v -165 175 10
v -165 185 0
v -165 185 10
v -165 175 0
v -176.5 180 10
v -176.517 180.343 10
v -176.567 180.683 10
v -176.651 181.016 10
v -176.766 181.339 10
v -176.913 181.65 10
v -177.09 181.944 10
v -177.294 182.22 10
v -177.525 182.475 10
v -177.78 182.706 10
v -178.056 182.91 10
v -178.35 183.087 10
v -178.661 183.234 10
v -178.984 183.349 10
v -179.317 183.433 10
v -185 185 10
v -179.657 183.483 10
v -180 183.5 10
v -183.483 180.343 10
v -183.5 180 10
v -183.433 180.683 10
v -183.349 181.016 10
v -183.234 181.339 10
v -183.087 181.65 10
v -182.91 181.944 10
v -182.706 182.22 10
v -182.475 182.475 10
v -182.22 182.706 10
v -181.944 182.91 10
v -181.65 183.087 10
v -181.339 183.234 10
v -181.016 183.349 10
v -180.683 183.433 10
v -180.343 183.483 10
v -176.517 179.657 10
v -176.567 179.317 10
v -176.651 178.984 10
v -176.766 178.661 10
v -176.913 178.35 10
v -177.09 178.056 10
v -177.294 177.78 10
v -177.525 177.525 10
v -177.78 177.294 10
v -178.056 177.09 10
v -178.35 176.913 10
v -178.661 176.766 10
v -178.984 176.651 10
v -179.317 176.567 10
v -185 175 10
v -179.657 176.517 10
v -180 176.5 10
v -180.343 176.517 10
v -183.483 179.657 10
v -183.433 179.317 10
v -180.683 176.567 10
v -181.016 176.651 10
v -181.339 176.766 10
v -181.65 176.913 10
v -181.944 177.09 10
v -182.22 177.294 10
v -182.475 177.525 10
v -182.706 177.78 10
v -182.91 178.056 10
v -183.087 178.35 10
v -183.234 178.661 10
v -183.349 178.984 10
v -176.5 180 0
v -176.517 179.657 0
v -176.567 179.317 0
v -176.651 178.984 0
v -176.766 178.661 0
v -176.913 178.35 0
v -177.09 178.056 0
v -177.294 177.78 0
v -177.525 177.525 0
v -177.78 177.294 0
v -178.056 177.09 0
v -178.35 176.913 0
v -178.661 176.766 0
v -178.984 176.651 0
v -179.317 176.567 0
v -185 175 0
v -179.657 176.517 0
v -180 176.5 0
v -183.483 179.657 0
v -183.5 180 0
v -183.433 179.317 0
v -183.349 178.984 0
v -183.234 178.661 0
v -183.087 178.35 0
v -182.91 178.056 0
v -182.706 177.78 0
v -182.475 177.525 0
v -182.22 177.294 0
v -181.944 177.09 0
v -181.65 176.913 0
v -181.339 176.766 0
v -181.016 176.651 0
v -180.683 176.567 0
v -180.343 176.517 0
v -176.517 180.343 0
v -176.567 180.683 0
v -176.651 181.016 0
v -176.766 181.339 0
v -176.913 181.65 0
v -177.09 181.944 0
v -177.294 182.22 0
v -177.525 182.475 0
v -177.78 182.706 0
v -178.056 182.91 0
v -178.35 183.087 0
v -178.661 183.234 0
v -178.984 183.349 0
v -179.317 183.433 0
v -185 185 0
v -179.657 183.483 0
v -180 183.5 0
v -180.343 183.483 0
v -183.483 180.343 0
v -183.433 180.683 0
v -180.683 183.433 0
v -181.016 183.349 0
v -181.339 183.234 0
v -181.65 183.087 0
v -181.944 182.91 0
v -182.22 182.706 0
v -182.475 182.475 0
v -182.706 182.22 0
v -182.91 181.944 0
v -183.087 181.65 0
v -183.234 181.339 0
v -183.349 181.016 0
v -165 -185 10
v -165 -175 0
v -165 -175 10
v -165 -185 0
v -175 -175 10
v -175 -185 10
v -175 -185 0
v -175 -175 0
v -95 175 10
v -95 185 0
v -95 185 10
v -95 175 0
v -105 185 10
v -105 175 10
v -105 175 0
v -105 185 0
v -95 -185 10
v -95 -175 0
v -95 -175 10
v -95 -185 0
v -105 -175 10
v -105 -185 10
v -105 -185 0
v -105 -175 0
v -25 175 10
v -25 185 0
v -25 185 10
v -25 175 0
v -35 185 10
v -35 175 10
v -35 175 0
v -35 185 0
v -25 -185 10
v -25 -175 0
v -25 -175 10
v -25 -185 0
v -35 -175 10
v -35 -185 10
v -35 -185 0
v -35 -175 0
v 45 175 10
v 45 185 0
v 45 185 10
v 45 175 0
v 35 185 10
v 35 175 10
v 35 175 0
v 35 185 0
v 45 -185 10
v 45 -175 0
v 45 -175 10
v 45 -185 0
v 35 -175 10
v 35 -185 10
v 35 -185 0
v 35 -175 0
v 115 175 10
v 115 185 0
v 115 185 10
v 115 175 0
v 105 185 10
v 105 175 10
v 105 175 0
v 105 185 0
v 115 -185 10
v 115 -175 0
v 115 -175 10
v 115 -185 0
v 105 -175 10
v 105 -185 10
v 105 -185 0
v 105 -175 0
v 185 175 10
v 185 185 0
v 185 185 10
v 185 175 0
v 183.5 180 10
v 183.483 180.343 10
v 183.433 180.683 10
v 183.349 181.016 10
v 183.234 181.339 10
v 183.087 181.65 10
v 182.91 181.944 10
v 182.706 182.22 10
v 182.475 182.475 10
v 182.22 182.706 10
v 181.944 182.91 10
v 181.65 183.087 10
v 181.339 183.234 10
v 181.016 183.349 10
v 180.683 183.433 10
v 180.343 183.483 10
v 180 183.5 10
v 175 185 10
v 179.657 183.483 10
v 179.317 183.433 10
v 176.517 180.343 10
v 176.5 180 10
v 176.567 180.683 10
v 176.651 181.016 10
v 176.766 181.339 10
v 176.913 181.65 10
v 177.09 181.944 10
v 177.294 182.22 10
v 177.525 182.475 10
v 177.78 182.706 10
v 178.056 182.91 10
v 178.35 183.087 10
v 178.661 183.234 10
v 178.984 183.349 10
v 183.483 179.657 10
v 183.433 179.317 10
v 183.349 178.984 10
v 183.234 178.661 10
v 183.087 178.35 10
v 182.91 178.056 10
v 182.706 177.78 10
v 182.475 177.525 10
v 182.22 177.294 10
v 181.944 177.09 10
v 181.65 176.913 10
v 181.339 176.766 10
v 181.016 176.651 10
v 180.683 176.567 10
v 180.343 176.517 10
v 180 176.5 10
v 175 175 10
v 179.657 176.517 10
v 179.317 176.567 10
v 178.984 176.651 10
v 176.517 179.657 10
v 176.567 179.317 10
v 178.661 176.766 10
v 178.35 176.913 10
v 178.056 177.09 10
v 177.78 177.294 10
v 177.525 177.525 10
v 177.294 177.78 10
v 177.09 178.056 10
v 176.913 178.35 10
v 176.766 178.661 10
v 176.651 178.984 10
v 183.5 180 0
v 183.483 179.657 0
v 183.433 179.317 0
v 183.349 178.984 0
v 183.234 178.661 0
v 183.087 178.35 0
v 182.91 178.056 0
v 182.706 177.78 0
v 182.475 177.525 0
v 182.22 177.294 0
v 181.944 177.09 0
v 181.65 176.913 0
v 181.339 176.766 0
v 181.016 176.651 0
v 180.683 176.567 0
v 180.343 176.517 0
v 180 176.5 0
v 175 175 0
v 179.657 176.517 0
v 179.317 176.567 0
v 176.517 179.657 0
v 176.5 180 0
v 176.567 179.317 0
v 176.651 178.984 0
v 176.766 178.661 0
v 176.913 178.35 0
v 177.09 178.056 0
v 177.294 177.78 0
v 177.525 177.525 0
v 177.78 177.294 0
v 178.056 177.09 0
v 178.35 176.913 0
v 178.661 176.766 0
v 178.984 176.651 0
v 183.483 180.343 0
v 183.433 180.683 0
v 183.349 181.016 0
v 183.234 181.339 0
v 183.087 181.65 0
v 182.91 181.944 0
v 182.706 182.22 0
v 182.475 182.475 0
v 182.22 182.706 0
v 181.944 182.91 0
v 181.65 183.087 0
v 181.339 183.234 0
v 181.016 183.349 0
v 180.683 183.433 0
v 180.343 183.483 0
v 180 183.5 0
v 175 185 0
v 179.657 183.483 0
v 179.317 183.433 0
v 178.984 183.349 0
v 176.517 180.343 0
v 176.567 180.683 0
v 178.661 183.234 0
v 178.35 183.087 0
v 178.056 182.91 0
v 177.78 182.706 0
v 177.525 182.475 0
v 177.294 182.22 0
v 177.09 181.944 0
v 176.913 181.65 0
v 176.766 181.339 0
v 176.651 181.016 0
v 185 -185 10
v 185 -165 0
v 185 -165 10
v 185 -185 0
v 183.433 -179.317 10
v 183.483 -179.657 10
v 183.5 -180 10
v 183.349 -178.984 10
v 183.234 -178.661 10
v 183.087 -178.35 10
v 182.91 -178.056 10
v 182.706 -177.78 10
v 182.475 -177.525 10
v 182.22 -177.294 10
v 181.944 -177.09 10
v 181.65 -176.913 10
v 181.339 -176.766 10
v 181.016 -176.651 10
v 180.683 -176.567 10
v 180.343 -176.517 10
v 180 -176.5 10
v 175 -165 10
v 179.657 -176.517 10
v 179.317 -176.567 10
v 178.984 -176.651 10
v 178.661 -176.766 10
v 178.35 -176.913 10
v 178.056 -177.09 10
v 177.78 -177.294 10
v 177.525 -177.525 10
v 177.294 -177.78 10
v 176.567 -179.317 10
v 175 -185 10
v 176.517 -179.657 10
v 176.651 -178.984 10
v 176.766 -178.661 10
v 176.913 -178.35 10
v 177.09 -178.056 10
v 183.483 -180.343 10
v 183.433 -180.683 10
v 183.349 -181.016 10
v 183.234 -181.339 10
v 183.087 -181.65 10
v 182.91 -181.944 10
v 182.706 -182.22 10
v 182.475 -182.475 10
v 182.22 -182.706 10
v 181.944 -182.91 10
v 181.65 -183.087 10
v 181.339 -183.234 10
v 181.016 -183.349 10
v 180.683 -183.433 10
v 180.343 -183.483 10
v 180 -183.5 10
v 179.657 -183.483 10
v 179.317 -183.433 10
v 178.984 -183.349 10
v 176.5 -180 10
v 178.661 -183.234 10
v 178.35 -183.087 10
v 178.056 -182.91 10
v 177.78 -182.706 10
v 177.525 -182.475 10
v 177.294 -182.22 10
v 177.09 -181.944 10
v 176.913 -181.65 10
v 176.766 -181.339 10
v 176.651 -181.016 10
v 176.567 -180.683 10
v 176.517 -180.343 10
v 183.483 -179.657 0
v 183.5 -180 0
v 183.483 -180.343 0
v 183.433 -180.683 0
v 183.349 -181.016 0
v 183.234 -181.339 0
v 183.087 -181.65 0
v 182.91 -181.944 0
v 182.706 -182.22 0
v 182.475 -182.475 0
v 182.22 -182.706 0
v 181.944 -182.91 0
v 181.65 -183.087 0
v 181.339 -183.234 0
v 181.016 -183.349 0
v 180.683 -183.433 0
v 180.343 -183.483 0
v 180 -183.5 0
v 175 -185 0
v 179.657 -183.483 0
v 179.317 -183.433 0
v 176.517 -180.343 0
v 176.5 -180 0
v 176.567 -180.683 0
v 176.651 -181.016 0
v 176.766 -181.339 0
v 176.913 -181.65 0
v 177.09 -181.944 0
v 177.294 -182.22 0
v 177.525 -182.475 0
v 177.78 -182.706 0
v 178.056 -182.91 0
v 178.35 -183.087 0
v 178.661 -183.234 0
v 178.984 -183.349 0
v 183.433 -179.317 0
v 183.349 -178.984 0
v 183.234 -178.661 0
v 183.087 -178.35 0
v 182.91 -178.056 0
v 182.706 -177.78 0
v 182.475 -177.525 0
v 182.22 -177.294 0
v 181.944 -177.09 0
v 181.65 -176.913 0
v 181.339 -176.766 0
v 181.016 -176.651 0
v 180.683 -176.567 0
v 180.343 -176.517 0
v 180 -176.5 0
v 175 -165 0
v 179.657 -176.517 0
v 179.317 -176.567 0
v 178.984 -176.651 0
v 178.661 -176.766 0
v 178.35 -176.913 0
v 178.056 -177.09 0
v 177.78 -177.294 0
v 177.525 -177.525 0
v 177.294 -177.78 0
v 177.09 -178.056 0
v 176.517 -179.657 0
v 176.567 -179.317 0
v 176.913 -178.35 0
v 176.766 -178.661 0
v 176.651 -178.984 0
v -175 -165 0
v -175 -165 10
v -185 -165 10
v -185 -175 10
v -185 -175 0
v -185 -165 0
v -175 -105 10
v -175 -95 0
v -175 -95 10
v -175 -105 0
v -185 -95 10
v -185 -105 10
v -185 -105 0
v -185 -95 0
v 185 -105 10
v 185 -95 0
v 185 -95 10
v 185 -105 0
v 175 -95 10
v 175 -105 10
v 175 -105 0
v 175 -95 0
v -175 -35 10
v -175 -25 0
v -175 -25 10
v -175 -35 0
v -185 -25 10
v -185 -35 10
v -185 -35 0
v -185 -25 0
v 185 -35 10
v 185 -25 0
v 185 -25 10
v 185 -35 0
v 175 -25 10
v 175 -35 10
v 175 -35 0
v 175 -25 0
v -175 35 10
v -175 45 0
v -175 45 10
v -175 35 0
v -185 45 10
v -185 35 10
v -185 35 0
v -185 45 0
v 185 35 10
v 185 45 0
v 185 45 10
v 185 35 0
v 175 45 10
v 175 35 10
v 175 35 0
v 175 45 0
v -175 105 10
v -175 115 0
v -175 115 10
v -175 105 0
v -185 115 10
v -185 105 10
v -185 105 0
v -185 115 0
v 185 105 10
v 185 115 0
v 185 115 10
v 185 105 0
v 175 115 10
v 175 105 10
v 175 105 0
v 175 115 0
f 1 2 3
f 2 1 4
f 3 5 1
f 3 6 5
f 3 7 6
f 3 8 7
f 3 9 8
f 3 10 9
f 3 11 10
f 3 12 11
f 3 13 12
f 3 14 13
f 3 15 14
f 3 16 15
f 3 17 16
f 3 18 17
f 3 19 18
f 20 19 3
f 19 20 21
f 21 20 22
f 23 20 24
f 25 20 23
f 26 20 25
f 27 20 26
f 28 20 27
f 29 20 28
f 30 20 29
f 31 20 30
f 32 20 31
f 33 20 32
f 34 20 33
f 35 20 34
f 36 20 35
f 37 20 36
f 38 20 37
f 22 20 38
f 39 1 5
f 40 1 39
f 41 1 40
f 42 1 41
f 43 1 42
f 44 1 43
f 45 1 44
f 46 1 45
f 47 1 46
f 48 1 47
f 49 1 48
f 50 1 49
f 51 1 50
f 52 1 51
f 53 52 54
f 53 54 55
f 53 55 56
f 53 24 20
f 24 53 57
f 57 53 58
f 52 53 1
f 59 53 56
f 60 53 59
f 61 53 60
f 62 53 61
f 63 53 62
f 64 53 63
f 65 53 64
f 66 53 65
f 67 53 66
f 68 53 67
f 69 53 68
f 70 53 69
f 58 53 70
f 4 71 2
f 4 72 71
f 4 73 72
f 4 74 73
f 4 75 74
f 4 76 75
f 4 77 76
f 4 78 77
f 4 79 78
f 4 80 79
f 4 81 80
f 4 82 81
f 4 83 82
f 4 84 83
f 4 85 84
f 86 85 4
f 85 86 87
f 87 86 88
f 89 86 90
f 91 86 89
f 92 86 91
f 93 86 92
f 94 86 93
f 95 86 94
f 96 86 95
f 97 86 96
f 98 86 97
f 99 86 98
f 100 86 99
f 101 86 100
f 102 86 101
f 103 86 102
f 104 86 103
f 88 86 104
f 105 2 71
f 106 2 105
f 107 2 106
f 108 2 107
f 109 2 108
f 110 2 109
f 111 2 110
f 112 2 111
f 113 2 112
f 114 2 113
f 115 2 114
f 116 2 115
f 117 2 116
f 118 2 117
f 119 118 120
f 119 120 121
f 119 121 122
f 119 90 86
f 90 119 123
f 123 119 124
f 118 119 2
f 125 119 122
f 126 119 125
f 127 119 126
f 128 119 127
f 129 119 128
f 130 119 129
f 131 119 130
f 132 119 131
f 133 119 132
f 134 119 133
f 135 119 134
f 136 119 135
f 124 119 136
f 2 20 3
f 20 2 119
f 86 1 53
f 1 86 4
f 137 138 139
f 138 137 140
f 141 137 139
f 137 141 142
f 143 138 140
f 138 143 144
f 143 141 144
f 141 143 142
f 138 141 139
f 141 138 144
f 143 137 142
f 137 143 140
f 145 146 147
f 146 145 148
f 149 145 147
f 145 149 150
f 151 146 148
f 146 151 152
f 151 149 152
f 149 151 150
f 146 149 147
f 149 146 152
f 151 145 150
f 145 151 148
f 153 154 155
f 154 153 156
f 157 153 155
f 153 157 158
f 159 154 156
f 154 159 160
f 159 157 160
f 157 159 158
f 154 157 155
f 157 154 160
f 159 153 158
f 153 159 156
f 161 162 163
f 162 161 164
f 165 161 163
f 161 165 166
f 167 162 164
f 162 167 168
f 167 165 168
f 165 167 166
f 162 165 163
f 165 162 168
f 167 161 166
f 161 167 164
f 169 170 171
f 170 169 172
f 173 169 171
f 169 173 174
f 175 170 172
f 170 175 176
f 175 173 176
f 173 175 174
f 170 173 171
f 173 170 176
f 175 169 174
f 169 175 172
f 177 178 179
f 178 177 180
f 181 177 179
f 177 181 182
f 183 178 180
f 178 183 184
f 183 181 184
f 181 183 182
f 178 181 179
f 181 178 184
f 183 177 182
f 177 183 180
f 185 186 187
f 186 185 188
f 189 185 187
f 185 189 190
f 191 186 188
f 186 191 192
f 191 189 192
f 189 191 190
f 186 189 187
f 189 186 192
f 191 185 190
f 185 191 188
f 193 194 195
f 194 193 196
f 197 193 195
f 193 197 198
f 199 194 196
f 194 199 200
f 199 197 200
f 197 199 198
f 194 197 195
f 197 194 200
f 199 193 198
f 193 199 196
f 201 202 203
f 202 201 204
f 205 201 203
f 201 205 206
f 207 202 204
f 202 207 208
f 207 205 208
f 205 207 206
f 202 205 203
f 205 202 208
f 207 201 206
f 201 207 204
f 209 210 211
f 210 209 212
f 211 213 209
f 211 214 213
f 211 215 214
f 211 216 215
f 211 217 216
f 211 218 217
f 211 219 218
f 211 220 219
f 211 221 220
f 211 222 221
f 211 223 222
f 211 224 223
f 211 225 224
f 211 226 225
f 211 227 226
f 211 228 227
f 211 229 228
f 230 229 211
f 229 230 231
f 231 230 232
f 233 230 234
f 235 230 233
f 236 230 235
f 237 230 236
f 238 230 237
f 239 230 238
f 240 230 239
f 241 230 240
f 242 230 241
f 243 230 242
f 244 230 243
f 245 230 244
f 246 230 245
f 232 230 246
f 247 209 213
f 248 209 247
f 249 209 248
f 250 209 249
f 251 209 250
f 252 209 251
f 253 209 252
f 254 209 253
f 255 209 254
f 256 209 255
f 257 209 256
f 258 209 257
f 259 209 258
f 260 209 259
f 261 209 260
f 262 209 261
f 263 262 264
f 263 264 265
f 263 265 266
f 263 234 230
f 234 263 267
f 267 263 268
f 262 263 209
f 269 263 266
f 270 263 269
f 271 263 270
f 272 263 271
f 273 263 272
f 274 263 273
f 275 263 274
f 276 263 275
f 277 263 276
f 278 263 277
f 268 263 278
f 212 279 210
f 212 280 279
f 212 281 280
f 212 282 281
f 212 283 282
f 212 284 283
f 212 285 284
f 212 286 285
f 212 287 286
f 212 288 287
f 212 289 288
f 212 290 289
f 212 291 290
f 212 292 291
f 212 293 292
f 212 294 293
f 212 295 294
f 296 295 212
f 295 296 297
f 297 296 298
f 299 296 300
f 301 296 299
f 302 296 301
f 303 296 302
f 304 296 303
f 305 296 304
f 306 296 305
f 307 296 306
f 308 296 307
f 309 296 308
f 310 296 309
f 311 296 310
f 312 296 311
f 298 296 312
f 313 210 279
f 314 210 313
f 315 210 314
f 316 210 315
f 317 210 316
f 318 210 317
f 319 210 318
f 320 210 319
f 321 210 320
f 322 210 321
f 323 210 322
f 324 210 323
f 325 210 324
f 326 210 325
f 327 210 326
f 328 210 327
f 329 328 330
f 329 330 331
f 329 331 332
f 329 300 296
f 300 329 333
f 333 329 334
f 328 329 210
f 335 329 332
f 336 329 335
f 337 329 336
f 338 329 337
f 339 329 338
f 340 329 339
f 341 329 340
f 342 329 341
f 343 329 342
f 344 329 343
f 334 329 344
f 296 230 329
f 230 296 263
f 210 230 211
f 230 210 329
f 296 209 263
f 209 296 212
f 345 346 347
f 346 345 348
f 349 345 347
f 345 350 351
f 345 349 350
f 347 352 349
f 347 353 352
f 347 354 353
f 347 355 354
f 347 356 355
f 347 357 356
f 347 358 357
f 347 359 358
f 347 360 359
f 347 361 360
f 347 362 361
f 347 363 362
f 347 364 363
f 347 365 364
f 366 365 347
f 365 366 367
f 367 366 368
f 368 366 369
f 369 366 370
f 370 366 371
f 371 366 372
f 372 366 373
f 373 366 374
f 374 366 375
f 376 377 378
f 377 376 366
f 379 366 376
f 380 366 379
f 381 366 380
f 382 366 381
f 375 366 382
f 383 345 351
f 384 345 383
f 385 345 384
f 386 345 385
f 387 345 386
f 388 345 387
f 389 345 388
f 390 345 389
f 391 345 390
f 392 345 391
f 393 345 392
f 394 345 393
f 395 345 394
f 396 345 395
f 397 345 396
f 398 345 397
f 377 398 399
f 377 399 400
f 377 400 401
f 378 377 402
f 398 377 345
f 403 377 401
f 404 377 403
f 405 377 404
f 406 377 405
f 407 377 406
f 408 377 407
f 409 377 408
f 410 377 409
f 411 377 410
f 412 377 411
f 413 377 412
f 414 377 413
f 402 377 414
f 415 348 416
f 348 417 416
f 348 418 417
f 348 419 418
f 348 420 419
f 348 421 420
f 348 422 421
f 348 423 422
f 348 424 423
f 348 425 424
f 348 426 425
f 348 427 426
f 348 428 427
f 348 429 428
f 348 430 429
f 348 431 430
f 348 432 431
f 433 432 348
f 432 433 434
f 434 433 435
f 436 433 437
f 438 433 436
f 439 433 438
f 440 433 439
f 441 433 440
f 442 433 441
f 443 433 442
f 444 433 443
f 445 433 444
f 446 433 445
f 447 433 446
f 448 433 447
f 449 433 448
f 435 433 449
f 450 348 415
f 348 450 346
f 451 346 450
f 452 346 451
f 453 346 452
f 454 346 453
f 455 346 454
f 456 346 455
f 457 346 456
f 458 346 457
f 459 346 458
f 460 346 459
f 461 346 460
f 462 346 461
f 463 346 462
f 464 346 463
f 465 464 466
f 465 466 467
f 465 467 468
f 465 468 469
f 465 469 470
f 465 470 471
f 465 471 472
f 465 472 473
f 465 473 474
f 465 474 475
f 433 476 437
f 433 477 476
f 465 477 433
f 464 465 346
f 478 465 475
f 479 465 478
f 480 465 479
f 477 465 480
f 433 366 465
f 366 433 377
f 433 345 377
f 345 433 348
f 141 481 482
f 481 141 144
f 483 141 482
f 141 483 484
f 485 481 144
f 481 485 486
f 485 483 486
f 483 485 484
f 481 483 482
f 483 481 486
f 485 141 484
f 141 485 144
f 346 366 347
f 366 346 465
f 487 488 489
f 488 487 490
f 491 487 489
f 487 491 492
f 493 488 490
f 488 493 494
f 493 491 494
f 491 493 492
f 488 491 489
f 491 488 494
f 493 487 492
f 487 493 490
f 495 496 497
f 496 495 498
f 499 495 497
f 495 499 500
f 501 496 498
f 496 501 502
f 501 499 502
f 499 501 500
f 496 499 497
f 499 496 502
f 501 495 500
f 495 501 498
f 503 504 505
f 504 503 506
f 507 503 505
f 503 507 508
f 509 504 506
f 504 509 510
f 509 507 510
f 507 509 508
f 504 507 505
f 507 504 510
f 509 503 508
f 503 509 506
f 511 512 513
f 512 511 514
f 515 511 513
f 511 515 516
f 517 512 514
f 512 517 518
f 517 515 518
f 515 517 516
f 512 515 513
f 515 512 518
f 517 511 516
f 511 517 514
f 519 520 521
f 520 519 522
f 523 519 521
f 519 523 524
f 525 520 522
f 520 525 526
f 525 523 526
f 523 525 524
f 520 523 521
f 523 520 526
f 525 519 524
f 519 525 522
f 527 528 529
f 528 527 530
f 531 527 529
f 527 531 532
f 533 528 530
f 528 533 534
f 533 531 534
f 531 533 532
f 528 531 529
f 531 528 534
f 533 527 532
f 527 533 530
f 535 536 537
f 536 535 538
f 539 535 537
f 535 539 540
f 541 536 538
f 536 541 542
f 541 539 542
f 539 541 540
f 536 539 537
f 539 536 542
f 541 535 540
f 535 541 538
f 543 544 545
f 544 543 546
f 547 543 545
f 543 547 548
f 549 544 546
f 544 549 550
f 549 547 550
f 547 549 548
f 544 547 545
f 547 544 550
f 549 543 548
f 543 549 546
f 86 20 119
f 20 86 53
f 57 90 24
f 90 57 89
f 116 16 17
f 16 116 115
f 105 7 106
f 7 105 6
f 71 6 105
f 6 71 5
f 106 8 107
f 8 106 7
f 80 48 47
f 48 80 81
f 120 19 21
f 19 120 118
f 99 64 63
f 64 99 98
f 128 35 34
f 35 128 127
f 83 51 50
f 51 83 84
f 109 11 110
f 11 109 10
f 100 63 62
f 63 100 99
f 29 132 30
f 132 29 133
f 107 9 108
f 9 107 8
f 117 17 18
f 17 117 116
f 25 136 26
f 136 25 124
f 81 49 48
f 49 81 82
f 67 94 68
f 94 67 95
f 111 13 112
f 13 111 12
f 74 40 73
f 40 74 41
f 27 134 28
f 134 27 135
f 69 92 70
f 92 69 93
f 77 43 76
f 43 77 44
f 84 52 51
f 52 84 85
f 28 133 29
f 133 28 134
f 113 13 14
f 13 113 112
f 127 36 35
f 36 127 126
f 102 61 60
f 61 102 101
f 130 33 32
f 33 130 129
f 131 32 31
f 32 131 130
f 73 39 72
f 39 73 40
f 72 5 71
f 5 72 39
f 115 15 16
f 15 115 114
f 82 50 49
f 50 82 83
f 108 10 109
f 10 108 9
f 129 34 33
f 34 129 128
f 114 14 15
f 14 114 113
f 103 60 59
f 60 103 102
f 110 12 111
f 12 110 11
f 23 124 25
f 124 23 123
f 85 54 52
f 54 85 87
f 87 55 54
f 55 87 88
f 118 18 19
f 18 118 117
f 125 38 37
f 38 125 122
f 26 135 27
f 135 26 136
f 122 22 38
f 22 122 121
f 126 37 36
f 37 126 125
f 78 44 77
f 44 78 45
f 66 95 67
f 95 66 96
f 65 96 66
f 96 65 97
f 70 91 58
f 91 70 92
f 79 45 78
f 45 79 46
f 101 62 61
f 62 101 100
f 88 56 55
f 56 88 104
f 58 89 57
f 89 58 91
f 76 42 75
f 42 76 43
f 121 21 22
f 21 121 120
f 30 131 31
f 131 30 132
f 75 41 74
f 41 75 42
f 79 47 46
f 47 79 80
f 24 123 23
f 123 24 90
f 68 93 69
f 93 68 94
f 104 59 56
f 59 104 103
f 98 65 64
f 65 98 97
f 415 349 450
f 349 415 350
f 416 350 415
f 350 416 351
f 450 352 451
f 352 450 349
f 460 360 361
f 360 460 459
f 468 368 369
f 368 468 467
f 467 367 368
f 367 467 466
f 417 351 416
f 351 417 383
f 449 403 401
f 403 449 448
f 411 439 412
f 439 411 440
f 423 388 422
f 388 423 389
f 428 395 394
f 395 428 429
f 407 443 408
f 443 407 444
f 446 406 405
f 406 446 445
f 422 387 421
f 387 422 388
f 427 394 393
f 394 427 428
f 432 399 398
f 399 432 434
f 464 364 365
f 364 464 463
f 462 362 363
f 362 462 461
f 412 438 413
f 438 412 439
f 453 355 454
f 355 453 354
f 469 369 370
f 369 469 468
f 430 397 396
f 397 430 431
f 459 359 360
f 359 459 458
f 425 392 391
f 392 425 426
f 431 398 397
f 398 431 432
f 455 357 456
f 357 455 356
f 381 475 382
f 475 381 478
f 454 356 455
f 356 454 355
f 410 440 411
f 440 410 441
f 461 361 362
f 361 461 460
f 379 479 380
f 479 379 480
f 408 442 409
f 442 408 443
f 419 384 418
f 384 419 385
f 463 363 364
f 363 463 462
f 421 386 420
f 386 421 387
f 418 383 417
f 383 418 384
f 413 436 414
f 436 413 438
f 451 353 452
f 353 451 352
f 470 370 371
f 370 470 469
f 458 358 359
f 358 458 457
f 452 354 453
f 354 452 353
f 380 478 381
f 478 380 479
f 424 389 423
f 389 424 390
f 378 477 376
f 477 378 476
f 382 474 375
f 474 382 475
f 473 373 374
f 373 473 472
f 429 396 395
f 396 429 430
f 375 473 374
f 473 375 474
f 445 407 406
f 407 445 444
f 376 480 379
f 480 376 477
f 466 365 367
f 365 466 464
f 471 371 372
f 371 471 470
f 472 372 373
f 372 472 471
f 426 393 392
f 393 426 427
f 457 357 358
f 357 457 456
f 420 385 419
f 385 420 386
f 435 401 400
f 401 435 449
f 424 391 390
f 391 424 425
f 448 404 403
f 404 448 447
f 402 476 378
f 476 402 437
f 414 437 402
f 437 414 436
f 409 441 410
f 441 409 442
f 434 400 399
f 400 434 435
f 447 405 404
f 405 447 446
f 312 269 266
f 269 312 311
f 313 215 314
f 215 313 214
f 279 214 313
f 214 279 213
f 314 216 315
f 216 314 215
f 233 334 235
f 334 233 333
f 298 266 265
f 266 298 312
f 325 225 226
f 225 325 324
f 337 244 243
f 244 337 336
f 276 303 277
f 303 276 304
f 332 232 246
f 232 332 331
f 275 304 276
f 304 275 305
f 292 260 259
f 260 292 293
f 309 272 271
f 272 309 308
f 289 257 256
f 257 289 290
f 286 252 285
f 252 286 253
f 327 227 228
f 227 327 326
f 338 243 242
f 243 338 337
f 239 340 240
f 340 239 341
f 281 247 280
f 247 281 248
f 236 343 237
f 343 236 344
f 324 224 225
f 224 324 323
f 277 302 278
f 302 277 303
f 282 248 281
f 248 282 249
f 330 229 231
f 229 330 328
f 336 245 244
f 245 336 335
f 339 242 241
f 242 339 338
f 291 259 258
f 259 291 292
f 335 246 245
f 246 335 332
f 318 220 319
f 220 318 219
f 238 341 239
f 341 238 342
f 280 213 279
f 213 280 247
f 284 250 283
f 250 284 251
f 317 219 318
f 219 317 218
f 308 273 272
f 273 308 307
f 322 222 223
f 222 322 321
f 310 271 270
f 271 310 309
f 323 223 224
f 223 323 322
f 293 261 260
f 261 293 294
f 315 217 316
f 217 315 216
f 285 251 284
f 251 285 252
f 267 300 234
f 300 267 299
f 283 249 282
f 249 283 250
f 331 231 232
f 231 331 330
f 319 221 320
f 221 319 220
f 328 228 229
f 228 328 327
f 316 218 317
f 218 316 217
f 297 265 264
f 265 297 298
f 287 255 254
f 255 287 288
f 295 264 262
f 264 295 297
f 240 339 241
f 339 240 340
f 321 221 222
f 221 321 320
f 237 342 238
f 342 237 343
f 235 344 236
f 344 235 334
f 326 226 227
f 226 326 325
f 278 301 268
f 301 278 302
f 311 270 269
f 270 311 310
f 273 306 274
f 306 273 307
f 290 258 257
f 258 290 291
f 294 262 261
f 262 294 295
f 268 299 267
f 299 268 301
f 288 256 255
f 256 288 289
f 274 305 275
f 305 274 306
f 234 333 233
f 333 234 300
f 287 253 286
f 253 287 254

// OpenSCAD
// ring_11.scad - ring index 11 (z bottom = 110 mm)
$fn = 64; bar = 10; half_b = bar/2; outer = 370; half_outer = outer/2;
front_y = 180; back_y = -180; left_x = -180; right_x = 180;
x_centers = [-170, -100, -30, 40, 110, 180];
z_centers = [5, 85, 155, 225, 295, 365, 435, 505, 575, 645, 715]; ring_z = 110;
module place_box(cx, cy, sx, sy) { translate([cx - sx/2, cy - sy/2, 0]) cube([sx, sy, bar]); }

difference() { union() {
    for (x = x_centers) { place_box(x, front_y, bar, bar); place_box(x, back_y, bar, bar); }
    for (y = x_centers) { place_box(left_x, y, bar, bar); place_box(right_x, y, bar, bar); }
    for (zc = z_centers) if ((zc - half_b < ring_z + bar) && (zc + half_b > ring_z)) {
        translate([-half_outer, front_y - half_b, 0]) cube([outer, bar, bar]);
        translate([-half_outer, back_y - half_b, 0])  cube([outer, bar, bar]);
        translate([left_x - half_b, -half_outer, 0])  cube([bar, outer, bar]);
        translate([right_x - half_b, -half_outer, 0]) cube([bar, outer, bar]);
    }
  }
  for (cx = [-180, 180]) for (cy = [-180, 180]) translate([cx, cy, 0]) cylinder(h = bar, r = 3.5, $fn = 64);
}
